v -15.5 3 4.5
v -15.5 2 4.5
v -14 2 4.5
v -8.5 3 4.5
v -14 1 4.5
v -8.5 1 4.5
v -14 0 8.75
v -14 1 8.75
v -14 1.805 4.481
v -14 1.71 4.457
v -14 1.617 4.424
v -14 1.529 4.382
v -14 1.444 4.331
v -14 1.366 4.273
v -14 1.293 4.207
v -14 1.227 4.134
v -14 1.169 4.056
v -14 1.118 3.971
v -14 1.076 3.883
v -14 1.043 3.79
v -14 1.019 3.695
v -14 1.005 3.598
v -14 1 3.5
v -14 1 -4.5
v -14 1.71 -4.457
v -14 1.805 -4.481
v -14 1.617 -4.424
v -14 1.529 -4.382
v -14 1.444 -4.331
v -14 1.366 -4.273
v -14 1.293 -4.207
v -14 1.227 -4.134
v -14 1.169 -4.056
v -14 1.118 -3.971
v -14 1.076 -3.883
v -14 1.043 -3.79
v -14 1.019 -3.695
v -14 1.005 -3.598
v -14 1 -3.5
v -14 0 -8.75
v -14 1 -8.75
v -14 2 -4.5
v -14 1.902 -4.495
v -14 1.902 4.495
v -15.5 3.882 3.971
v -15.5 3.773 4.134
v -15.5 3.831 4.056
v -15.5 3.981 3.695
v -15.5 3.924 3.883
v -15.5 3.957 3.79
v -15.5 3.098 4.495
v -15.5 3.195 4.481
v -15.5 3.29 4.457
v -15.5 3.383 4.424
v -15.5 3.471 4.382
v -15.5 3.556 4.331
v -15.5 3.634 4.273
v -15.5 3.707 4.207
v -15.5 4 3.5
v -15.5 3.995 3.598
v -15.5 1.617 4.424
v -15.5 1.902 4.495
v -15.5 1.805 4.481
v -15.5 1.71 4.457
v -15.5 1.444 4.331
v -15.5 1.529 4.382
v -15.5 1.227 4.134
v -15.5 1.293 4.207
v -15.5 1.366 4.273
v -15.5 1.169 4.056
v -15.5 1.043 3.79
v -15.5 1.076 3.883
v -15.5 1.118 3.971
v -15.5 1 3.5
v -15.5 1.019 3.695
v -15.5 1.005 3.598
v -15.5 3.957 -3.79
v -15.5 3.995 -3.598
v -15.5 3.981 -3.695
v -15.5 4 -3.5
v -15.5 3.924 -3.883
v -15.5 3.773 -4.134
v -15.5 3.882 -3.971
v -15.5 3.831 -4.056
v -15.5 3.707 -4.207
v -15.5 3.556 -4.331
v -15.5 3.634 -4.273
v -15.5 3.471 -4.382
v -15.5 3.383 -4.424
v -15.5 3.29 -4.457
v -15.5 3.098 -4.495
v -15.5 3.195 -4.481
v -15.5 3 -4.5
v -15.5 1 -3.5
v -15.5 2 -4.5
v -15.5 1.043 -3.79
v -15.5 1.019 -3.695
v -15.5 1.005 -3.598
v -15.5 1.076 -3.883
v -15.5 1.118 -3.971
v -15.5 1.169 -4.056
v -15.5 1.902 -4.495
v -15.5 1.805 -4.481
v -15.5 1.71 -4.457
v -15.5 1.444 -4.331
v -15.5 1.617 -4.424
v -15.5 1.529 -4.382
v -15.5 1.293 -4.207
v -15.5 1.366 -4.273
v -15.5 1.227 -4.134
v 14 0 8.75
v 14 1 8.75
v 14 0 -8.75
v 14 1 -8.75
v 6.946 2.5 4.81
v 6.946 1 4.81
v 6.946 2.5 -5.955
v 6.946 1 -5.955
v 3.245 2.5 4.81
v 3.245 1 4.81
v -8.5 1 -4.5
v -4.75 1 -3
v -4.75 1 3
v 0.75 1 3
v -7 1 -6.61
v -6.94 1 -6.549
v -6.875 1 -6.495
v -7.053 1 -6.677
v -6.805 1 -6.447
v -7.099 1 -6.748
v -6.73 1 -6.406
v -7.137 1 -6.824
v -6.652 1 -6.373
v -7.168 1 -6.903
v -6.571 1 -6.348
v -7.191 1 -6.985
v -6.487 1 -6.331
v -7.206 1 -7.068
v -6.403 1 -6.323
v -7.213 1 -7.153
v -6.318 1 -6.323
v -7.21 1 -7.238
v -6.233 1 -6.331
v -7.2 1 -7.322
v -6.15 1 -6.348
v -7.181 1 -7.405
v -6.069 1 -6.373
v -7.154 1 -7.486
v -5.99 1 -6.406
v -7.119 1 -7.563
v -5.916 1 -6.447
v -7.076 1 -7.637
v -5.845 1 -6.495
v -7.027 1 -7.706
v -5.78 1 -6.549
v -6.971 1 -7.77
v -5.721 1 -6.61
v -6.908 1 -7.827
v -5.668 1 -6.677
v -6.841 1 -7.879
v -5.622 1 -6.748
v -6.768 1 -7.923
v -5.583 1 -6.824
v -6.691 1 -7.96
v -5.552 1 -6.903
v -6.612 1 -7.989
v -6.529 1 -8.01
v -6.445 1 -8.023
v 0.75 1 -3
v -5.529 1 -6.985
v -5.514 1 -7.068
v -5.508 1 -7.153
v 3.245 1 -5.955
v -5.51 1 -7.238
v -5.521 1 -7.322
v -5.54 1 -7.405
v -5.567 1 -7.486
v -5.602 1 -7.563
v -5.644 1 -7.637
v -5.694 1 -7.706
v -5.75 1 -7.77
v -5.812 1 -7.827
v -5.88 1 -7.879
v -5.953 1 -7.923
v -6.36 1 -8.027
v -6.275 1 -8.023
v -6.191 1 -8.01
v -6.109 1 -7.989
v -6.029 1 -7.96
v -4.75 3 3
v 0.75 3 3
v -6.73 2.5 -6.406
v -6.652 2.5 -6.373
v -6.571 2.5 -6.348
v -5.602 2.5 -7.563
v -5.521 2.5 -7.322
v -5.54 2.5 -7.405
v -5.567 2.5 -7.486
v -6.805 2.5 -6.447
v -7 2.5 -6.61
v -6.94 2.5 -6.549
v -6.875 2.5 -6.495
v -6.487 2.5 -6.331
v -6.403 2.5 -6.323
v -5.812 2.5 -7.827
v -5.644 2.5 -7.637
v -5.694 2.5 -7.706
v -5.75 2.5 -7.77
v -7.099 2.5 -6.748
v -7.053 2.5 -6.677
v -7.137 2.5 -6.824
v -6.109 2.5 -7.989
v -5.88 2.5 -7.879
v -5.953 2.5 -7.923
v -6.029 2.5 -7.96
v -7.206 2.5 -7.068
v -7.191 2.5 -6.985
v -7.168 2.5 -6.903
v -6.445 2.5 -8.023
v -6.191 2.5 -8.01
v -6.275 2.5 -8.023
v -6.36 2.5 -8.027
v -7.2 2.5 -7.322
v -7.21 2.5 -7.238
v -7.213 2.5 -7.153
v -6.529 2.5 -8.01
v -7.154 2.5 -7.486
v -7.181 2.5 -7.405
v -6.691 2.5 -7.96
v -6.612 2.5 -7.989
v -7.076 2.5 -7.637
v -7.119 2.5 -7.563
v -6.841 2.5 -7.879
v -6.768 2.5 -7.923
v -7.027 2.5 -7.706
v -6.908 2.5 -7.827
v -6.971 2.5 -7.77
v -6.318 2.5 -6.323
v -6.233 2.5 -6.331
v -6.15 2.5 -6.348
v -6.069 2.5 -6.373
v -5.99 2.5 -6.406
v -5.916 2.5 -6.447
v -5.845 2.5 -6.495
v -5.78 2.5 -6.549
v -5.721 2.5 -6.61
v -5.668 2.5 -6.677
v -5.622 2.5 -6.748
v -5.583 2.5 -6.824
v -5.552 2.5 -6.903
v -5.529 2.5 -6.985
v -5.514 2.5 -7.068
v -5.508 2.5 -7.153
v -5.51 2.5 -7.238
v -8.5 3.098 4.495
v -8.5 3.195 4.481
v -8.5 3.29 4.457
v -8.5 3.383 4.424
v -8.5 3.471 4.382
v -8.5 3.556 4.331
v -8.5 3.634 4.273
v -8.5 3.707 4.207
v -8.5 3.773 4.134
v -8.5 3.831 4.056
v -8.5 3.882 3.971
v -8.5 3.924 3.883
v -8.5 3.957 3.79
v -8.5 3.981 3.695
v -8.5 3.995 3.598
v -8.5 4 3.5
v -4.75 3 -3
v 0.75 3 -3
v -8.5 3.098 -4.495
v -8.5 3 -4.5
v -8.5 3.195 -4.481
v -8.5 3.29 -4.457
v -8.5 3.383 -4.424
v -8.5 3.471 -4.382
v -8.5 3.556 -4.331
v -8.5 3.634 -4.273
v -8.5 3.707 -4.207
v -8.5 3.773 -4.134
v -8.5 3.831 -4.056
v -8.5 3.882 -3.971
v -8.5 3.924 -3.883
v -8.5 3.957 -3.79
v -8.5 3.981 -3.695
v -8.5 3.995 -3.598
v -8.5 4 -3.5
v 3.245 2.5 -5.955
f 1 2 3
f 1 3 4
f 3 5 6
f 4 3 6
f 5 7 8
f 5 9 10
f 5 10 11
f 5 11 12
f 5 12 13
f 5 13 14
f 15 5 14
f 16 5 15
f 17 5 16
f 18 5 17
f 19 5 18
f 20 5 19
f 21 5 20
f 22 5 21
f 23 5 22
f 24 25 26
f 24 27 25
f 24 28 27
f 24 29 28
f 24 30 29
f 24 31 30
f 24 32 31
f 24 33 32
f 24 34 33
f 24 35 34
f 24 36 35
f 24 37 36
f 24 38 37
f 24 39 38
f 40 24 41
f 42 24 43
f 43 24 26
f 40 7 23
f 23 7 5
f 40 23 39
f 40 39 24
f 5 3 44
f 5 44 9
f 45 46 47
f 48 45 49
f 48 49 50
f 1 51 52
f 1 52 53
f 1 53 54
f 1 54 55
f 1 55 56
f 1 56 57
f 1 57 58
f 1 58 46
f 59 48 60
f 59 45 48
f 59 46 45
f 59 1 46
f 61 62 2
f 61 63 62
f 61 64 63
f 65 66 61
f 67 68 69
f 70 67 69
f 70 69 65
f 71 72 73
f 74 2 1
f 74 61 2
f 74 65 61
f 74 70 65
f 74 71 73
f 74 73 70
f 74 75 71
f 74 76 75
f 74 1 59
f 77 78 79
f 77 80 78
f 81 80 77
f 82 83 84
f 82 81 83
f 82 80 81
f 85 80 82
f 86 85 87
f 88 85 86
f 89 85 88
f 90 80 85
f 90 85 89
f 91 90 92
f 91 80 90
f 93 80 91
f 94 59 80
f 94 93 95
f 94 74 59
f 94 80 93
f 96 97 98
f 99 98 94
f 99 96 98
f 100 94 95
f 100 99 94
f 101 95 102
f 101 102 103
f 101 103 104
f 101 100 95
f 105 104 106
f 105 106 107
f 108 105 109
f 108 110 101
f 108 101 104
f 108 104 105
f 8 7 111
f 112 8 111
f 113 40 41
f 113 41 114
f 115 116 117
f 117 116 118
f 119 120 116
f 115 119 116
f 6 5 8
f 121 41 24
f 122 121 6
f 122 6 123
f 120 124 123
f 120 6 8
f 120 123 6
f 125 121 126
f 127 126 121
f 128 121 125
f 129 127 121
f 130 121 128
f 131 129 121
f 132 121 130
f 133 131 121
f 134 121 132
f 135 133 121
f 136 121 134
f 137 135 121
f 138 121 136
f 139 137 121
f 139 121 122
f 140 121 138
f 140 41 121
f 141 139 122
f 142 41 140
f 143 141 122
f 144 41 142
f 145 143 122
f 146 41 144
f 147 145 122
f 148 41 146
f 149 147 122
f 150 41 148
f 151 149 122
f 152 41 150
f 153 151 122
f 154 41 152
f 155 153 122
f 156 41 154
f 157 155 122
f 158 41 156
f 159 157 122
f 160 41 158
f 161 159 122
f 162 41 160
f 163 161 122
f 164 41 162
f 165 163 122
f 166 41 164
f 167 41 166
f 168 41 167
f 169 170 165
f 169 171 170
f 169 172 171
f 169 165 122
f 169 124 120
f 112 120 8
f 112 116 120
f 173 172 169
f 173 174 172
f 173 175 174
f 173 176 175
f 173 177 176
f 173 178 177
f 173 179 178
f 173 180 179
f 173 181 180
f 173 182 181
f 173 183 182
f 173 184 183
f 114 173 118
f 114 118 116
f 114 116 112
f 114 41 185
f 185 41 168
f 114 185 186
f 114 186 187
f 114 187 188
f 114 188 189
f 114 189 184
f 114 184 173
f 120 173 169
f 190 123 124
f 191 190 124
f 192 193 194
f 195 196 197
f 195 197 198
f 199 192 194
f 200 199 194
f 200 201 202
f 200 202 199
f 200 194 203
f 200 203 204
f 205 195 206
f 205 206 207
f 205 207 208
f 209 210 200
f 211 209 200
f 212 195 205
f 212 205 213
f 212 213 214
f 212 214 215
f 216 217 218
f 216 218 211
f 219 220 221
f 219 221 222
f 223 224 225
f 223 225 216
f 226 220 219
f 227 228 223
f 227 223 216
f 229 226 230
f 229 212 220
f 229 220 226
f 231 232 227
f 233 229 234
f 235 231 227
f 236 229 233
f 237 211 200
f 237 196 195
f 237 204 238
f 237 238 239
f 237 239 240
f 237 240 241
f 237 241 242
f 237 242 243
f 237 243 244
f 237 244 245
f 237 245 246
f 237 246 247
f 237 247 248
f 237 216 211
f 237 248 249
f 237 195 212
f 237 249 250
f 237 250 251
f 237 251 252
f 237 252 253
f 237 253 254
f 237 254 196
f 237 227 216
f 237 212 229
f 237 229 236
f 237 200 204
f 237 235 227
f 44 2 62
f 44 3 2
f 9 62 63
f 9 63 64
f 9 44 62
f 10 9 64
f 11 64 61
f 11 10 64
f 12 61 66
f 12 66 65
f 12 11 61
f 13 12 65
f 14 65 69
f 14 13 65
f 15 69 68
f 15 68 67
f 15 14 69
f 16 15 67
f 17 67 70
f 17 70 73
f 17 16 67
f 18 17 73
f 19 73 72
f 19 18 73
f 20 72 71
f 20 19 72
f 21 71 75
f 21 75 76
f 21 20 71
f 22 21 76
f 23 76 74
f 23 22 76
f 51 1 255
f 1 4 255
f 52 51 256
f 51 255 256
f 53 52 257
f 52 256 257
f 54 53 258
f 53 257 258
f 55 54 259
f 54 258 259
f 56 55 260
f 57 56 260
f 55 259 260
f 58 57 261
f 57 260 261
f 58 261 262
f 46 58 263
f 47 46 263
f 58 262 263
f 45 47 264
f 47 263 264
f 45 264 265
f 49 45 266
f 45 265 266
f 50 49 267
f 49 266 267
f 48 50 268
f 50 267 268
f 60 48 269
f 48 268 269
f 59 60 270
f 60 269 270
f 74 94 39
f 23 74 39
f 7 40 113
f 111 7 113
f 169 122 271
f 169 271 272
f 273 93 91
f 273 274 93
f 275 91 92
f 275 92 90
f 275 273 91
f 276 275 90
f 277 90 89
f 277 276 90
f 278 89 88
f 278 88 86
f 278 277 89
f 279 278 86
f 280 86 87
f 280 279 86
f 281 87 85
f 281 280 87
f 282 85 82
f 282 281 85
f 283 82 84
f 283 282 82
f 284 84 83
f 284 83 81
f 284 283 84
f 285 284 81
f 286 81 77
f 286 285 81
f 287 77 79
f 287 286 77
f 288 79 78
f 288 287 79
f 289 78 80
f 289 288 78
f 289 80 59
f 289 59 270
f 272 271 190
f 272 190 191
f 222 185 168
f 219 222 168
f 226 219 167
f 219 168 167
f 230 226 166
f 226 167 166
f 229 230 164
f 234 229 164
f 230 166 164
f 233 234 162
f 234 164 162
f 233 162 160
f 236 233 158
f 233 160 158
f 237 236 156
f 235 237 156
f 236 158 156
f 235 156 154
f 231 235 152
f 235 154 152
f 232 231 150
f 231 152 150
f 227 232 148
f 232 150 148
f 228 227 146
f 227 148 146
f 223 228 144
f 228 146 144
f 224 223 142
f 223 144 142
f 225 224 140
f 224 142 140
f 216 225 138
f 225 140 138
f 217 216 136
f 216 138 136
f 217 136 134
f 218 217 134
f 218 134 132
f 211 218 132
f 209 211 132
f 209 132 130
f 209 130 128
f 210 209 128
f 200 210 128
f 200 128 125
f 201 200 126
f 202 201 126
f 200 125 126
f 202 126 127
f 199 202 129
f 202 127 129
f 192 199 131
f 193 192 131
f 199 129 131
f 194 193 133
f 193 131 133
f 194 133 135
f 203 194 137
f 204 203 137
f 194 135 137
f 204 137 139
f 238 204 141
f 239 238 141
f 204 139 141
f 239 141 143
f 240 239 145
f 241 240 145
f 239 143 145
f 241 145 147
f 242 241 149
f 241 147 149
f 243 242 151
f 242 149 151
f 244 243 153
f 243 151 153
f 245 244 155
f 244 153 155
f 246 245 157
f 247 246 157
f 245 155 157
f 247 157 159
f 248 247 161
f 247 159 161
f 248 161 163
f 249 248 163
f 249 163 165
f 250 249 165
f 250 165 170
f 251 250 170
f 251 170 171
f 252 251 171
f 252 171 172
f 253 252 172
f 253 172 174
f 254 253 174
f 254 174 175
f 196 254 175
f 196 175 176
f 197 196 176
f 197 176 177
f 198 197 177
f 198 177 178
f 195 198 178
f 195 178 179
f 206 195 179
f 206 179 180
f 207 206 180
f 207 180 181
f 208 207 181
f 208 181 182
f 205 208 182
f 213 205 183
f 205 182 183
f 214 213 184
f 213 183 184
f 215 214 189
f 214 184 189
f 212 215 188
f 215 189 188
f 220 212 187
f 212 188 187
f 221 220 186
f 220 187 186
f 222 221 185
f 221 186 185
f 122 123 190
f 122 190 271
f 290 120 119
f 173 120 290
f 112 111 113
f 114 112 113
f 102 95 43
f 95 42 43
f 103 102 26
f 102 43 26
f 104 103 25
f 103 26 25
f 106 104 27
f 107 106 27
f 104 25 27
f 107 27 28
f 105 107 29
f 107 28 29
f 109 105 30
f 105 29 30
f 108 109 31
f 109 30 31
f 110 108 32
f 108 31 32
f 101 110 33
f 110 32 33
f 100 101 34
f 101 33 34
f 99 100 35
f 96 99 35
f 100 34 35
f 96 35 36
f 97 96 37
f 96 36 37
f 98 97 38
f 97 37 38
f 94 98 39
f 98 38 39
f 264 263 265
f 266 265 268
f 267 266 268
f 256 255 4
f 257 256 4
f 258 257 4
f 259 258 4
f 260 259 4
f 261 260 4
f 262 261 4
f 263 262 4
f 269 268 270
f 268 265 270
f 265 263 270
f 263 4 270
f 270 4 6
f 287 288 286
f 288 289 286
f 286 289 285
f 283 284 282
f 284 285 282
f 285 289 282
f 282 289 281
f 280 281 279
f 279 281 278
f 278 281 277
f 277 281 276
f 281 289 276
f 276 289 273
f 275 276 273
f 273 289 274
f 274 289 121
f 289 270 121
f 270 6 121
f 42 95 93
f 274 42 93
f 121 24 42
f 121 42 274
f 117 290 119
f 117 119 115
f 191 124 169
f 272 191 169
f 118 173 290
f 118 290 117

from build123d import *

# Parameters (mm, degrees)
SKETCH1_W           = 28
SKETCH1_H           = 17.5
BOSS_EXTRUDE1_DEPTH = 1
SKETCH2_W           = 7
SKETCH2_H           = 9
BOSS_EXTRUDE2_DEPTH = 3
FILLET1_R           = 1
SKETCH3_W           = 5.5
SKETCH3_H           = 6
BOSS_EXTRUDE3_DEPTH = 2
SKETCH4_R           = 0.852579897
SKETCH4_W           = 3.701013581
SKETCH4_H           = 10.765249821
BOSS_EXTRUDE5_DEPTH = 1.5


with BuildPart() as part:
    # Sketch1 → Boss-Extrude1 (new body)
    with BuildSketch(Plane(origin=(0, 0, 0), x_dir=(1, 0, 0), z_dir=(0, 1, 0))):
        Rectangle(SKETCH1_W, SKETCH1_H)
    extrude(amount=BOSS_EXTRUDE1_DEPTH)

    # Sketch2 → Boss-Extrude2 (add)
    with BuildSketch(Plane(origin=(0, 1, 0), x_dir=(1, 0, 0), z_dir=(0, 1, 0))):
        with Locations((-12, 0)):
            Rectangle(SKETCH2_W, SKETCH2_H)
    extrude(amount=BOSS_EXTRUDE2_DEPTH)

    # Fillet1
    fillet1_edges = [part.edges().sort_by_distance(p)[0] for p in [
        (-14.75, 1, 4.5),
        (-14.75, 1, -4.5),
        (-12, 4, 4.5),
        (-12, 4, -4.5),
    ]]
    fillet(fillet1_edges, radius=FILLET1_R)

    # Sketch3 → Boss-Extrude3 (add)
    with BuildSketch(Plane(origin=(0, 1, 0), x_dir=(1, 0, 0), z_dir=(0, 1, 0))):
        with Locations((-2, 0)):
            Rectangle(SKETCH3_W, SKETCH3_H)
    extrude(amount=BOSS_EXTRUDE3_DEPTH)

    # Sketch4 → Boss-Extrude5 (add)
    with BuildSketch(Plane(origin=(0, 1, 0), x_dir=(1, 0, 0), z_dir=(0, 1, 0))):
        with Locations(Location((-6.360266619, 7.174385454, 0), (0, 0, 90))):
            Circle(SKETCH4_R)
        with Locations((5.095251608, 0.572775911)):
            Rectangle(SKETCH4_W, SKETCH4_H)
    extrude(amount=BOSS_EXTRUDE5_DEPTH)


solid = part.part
